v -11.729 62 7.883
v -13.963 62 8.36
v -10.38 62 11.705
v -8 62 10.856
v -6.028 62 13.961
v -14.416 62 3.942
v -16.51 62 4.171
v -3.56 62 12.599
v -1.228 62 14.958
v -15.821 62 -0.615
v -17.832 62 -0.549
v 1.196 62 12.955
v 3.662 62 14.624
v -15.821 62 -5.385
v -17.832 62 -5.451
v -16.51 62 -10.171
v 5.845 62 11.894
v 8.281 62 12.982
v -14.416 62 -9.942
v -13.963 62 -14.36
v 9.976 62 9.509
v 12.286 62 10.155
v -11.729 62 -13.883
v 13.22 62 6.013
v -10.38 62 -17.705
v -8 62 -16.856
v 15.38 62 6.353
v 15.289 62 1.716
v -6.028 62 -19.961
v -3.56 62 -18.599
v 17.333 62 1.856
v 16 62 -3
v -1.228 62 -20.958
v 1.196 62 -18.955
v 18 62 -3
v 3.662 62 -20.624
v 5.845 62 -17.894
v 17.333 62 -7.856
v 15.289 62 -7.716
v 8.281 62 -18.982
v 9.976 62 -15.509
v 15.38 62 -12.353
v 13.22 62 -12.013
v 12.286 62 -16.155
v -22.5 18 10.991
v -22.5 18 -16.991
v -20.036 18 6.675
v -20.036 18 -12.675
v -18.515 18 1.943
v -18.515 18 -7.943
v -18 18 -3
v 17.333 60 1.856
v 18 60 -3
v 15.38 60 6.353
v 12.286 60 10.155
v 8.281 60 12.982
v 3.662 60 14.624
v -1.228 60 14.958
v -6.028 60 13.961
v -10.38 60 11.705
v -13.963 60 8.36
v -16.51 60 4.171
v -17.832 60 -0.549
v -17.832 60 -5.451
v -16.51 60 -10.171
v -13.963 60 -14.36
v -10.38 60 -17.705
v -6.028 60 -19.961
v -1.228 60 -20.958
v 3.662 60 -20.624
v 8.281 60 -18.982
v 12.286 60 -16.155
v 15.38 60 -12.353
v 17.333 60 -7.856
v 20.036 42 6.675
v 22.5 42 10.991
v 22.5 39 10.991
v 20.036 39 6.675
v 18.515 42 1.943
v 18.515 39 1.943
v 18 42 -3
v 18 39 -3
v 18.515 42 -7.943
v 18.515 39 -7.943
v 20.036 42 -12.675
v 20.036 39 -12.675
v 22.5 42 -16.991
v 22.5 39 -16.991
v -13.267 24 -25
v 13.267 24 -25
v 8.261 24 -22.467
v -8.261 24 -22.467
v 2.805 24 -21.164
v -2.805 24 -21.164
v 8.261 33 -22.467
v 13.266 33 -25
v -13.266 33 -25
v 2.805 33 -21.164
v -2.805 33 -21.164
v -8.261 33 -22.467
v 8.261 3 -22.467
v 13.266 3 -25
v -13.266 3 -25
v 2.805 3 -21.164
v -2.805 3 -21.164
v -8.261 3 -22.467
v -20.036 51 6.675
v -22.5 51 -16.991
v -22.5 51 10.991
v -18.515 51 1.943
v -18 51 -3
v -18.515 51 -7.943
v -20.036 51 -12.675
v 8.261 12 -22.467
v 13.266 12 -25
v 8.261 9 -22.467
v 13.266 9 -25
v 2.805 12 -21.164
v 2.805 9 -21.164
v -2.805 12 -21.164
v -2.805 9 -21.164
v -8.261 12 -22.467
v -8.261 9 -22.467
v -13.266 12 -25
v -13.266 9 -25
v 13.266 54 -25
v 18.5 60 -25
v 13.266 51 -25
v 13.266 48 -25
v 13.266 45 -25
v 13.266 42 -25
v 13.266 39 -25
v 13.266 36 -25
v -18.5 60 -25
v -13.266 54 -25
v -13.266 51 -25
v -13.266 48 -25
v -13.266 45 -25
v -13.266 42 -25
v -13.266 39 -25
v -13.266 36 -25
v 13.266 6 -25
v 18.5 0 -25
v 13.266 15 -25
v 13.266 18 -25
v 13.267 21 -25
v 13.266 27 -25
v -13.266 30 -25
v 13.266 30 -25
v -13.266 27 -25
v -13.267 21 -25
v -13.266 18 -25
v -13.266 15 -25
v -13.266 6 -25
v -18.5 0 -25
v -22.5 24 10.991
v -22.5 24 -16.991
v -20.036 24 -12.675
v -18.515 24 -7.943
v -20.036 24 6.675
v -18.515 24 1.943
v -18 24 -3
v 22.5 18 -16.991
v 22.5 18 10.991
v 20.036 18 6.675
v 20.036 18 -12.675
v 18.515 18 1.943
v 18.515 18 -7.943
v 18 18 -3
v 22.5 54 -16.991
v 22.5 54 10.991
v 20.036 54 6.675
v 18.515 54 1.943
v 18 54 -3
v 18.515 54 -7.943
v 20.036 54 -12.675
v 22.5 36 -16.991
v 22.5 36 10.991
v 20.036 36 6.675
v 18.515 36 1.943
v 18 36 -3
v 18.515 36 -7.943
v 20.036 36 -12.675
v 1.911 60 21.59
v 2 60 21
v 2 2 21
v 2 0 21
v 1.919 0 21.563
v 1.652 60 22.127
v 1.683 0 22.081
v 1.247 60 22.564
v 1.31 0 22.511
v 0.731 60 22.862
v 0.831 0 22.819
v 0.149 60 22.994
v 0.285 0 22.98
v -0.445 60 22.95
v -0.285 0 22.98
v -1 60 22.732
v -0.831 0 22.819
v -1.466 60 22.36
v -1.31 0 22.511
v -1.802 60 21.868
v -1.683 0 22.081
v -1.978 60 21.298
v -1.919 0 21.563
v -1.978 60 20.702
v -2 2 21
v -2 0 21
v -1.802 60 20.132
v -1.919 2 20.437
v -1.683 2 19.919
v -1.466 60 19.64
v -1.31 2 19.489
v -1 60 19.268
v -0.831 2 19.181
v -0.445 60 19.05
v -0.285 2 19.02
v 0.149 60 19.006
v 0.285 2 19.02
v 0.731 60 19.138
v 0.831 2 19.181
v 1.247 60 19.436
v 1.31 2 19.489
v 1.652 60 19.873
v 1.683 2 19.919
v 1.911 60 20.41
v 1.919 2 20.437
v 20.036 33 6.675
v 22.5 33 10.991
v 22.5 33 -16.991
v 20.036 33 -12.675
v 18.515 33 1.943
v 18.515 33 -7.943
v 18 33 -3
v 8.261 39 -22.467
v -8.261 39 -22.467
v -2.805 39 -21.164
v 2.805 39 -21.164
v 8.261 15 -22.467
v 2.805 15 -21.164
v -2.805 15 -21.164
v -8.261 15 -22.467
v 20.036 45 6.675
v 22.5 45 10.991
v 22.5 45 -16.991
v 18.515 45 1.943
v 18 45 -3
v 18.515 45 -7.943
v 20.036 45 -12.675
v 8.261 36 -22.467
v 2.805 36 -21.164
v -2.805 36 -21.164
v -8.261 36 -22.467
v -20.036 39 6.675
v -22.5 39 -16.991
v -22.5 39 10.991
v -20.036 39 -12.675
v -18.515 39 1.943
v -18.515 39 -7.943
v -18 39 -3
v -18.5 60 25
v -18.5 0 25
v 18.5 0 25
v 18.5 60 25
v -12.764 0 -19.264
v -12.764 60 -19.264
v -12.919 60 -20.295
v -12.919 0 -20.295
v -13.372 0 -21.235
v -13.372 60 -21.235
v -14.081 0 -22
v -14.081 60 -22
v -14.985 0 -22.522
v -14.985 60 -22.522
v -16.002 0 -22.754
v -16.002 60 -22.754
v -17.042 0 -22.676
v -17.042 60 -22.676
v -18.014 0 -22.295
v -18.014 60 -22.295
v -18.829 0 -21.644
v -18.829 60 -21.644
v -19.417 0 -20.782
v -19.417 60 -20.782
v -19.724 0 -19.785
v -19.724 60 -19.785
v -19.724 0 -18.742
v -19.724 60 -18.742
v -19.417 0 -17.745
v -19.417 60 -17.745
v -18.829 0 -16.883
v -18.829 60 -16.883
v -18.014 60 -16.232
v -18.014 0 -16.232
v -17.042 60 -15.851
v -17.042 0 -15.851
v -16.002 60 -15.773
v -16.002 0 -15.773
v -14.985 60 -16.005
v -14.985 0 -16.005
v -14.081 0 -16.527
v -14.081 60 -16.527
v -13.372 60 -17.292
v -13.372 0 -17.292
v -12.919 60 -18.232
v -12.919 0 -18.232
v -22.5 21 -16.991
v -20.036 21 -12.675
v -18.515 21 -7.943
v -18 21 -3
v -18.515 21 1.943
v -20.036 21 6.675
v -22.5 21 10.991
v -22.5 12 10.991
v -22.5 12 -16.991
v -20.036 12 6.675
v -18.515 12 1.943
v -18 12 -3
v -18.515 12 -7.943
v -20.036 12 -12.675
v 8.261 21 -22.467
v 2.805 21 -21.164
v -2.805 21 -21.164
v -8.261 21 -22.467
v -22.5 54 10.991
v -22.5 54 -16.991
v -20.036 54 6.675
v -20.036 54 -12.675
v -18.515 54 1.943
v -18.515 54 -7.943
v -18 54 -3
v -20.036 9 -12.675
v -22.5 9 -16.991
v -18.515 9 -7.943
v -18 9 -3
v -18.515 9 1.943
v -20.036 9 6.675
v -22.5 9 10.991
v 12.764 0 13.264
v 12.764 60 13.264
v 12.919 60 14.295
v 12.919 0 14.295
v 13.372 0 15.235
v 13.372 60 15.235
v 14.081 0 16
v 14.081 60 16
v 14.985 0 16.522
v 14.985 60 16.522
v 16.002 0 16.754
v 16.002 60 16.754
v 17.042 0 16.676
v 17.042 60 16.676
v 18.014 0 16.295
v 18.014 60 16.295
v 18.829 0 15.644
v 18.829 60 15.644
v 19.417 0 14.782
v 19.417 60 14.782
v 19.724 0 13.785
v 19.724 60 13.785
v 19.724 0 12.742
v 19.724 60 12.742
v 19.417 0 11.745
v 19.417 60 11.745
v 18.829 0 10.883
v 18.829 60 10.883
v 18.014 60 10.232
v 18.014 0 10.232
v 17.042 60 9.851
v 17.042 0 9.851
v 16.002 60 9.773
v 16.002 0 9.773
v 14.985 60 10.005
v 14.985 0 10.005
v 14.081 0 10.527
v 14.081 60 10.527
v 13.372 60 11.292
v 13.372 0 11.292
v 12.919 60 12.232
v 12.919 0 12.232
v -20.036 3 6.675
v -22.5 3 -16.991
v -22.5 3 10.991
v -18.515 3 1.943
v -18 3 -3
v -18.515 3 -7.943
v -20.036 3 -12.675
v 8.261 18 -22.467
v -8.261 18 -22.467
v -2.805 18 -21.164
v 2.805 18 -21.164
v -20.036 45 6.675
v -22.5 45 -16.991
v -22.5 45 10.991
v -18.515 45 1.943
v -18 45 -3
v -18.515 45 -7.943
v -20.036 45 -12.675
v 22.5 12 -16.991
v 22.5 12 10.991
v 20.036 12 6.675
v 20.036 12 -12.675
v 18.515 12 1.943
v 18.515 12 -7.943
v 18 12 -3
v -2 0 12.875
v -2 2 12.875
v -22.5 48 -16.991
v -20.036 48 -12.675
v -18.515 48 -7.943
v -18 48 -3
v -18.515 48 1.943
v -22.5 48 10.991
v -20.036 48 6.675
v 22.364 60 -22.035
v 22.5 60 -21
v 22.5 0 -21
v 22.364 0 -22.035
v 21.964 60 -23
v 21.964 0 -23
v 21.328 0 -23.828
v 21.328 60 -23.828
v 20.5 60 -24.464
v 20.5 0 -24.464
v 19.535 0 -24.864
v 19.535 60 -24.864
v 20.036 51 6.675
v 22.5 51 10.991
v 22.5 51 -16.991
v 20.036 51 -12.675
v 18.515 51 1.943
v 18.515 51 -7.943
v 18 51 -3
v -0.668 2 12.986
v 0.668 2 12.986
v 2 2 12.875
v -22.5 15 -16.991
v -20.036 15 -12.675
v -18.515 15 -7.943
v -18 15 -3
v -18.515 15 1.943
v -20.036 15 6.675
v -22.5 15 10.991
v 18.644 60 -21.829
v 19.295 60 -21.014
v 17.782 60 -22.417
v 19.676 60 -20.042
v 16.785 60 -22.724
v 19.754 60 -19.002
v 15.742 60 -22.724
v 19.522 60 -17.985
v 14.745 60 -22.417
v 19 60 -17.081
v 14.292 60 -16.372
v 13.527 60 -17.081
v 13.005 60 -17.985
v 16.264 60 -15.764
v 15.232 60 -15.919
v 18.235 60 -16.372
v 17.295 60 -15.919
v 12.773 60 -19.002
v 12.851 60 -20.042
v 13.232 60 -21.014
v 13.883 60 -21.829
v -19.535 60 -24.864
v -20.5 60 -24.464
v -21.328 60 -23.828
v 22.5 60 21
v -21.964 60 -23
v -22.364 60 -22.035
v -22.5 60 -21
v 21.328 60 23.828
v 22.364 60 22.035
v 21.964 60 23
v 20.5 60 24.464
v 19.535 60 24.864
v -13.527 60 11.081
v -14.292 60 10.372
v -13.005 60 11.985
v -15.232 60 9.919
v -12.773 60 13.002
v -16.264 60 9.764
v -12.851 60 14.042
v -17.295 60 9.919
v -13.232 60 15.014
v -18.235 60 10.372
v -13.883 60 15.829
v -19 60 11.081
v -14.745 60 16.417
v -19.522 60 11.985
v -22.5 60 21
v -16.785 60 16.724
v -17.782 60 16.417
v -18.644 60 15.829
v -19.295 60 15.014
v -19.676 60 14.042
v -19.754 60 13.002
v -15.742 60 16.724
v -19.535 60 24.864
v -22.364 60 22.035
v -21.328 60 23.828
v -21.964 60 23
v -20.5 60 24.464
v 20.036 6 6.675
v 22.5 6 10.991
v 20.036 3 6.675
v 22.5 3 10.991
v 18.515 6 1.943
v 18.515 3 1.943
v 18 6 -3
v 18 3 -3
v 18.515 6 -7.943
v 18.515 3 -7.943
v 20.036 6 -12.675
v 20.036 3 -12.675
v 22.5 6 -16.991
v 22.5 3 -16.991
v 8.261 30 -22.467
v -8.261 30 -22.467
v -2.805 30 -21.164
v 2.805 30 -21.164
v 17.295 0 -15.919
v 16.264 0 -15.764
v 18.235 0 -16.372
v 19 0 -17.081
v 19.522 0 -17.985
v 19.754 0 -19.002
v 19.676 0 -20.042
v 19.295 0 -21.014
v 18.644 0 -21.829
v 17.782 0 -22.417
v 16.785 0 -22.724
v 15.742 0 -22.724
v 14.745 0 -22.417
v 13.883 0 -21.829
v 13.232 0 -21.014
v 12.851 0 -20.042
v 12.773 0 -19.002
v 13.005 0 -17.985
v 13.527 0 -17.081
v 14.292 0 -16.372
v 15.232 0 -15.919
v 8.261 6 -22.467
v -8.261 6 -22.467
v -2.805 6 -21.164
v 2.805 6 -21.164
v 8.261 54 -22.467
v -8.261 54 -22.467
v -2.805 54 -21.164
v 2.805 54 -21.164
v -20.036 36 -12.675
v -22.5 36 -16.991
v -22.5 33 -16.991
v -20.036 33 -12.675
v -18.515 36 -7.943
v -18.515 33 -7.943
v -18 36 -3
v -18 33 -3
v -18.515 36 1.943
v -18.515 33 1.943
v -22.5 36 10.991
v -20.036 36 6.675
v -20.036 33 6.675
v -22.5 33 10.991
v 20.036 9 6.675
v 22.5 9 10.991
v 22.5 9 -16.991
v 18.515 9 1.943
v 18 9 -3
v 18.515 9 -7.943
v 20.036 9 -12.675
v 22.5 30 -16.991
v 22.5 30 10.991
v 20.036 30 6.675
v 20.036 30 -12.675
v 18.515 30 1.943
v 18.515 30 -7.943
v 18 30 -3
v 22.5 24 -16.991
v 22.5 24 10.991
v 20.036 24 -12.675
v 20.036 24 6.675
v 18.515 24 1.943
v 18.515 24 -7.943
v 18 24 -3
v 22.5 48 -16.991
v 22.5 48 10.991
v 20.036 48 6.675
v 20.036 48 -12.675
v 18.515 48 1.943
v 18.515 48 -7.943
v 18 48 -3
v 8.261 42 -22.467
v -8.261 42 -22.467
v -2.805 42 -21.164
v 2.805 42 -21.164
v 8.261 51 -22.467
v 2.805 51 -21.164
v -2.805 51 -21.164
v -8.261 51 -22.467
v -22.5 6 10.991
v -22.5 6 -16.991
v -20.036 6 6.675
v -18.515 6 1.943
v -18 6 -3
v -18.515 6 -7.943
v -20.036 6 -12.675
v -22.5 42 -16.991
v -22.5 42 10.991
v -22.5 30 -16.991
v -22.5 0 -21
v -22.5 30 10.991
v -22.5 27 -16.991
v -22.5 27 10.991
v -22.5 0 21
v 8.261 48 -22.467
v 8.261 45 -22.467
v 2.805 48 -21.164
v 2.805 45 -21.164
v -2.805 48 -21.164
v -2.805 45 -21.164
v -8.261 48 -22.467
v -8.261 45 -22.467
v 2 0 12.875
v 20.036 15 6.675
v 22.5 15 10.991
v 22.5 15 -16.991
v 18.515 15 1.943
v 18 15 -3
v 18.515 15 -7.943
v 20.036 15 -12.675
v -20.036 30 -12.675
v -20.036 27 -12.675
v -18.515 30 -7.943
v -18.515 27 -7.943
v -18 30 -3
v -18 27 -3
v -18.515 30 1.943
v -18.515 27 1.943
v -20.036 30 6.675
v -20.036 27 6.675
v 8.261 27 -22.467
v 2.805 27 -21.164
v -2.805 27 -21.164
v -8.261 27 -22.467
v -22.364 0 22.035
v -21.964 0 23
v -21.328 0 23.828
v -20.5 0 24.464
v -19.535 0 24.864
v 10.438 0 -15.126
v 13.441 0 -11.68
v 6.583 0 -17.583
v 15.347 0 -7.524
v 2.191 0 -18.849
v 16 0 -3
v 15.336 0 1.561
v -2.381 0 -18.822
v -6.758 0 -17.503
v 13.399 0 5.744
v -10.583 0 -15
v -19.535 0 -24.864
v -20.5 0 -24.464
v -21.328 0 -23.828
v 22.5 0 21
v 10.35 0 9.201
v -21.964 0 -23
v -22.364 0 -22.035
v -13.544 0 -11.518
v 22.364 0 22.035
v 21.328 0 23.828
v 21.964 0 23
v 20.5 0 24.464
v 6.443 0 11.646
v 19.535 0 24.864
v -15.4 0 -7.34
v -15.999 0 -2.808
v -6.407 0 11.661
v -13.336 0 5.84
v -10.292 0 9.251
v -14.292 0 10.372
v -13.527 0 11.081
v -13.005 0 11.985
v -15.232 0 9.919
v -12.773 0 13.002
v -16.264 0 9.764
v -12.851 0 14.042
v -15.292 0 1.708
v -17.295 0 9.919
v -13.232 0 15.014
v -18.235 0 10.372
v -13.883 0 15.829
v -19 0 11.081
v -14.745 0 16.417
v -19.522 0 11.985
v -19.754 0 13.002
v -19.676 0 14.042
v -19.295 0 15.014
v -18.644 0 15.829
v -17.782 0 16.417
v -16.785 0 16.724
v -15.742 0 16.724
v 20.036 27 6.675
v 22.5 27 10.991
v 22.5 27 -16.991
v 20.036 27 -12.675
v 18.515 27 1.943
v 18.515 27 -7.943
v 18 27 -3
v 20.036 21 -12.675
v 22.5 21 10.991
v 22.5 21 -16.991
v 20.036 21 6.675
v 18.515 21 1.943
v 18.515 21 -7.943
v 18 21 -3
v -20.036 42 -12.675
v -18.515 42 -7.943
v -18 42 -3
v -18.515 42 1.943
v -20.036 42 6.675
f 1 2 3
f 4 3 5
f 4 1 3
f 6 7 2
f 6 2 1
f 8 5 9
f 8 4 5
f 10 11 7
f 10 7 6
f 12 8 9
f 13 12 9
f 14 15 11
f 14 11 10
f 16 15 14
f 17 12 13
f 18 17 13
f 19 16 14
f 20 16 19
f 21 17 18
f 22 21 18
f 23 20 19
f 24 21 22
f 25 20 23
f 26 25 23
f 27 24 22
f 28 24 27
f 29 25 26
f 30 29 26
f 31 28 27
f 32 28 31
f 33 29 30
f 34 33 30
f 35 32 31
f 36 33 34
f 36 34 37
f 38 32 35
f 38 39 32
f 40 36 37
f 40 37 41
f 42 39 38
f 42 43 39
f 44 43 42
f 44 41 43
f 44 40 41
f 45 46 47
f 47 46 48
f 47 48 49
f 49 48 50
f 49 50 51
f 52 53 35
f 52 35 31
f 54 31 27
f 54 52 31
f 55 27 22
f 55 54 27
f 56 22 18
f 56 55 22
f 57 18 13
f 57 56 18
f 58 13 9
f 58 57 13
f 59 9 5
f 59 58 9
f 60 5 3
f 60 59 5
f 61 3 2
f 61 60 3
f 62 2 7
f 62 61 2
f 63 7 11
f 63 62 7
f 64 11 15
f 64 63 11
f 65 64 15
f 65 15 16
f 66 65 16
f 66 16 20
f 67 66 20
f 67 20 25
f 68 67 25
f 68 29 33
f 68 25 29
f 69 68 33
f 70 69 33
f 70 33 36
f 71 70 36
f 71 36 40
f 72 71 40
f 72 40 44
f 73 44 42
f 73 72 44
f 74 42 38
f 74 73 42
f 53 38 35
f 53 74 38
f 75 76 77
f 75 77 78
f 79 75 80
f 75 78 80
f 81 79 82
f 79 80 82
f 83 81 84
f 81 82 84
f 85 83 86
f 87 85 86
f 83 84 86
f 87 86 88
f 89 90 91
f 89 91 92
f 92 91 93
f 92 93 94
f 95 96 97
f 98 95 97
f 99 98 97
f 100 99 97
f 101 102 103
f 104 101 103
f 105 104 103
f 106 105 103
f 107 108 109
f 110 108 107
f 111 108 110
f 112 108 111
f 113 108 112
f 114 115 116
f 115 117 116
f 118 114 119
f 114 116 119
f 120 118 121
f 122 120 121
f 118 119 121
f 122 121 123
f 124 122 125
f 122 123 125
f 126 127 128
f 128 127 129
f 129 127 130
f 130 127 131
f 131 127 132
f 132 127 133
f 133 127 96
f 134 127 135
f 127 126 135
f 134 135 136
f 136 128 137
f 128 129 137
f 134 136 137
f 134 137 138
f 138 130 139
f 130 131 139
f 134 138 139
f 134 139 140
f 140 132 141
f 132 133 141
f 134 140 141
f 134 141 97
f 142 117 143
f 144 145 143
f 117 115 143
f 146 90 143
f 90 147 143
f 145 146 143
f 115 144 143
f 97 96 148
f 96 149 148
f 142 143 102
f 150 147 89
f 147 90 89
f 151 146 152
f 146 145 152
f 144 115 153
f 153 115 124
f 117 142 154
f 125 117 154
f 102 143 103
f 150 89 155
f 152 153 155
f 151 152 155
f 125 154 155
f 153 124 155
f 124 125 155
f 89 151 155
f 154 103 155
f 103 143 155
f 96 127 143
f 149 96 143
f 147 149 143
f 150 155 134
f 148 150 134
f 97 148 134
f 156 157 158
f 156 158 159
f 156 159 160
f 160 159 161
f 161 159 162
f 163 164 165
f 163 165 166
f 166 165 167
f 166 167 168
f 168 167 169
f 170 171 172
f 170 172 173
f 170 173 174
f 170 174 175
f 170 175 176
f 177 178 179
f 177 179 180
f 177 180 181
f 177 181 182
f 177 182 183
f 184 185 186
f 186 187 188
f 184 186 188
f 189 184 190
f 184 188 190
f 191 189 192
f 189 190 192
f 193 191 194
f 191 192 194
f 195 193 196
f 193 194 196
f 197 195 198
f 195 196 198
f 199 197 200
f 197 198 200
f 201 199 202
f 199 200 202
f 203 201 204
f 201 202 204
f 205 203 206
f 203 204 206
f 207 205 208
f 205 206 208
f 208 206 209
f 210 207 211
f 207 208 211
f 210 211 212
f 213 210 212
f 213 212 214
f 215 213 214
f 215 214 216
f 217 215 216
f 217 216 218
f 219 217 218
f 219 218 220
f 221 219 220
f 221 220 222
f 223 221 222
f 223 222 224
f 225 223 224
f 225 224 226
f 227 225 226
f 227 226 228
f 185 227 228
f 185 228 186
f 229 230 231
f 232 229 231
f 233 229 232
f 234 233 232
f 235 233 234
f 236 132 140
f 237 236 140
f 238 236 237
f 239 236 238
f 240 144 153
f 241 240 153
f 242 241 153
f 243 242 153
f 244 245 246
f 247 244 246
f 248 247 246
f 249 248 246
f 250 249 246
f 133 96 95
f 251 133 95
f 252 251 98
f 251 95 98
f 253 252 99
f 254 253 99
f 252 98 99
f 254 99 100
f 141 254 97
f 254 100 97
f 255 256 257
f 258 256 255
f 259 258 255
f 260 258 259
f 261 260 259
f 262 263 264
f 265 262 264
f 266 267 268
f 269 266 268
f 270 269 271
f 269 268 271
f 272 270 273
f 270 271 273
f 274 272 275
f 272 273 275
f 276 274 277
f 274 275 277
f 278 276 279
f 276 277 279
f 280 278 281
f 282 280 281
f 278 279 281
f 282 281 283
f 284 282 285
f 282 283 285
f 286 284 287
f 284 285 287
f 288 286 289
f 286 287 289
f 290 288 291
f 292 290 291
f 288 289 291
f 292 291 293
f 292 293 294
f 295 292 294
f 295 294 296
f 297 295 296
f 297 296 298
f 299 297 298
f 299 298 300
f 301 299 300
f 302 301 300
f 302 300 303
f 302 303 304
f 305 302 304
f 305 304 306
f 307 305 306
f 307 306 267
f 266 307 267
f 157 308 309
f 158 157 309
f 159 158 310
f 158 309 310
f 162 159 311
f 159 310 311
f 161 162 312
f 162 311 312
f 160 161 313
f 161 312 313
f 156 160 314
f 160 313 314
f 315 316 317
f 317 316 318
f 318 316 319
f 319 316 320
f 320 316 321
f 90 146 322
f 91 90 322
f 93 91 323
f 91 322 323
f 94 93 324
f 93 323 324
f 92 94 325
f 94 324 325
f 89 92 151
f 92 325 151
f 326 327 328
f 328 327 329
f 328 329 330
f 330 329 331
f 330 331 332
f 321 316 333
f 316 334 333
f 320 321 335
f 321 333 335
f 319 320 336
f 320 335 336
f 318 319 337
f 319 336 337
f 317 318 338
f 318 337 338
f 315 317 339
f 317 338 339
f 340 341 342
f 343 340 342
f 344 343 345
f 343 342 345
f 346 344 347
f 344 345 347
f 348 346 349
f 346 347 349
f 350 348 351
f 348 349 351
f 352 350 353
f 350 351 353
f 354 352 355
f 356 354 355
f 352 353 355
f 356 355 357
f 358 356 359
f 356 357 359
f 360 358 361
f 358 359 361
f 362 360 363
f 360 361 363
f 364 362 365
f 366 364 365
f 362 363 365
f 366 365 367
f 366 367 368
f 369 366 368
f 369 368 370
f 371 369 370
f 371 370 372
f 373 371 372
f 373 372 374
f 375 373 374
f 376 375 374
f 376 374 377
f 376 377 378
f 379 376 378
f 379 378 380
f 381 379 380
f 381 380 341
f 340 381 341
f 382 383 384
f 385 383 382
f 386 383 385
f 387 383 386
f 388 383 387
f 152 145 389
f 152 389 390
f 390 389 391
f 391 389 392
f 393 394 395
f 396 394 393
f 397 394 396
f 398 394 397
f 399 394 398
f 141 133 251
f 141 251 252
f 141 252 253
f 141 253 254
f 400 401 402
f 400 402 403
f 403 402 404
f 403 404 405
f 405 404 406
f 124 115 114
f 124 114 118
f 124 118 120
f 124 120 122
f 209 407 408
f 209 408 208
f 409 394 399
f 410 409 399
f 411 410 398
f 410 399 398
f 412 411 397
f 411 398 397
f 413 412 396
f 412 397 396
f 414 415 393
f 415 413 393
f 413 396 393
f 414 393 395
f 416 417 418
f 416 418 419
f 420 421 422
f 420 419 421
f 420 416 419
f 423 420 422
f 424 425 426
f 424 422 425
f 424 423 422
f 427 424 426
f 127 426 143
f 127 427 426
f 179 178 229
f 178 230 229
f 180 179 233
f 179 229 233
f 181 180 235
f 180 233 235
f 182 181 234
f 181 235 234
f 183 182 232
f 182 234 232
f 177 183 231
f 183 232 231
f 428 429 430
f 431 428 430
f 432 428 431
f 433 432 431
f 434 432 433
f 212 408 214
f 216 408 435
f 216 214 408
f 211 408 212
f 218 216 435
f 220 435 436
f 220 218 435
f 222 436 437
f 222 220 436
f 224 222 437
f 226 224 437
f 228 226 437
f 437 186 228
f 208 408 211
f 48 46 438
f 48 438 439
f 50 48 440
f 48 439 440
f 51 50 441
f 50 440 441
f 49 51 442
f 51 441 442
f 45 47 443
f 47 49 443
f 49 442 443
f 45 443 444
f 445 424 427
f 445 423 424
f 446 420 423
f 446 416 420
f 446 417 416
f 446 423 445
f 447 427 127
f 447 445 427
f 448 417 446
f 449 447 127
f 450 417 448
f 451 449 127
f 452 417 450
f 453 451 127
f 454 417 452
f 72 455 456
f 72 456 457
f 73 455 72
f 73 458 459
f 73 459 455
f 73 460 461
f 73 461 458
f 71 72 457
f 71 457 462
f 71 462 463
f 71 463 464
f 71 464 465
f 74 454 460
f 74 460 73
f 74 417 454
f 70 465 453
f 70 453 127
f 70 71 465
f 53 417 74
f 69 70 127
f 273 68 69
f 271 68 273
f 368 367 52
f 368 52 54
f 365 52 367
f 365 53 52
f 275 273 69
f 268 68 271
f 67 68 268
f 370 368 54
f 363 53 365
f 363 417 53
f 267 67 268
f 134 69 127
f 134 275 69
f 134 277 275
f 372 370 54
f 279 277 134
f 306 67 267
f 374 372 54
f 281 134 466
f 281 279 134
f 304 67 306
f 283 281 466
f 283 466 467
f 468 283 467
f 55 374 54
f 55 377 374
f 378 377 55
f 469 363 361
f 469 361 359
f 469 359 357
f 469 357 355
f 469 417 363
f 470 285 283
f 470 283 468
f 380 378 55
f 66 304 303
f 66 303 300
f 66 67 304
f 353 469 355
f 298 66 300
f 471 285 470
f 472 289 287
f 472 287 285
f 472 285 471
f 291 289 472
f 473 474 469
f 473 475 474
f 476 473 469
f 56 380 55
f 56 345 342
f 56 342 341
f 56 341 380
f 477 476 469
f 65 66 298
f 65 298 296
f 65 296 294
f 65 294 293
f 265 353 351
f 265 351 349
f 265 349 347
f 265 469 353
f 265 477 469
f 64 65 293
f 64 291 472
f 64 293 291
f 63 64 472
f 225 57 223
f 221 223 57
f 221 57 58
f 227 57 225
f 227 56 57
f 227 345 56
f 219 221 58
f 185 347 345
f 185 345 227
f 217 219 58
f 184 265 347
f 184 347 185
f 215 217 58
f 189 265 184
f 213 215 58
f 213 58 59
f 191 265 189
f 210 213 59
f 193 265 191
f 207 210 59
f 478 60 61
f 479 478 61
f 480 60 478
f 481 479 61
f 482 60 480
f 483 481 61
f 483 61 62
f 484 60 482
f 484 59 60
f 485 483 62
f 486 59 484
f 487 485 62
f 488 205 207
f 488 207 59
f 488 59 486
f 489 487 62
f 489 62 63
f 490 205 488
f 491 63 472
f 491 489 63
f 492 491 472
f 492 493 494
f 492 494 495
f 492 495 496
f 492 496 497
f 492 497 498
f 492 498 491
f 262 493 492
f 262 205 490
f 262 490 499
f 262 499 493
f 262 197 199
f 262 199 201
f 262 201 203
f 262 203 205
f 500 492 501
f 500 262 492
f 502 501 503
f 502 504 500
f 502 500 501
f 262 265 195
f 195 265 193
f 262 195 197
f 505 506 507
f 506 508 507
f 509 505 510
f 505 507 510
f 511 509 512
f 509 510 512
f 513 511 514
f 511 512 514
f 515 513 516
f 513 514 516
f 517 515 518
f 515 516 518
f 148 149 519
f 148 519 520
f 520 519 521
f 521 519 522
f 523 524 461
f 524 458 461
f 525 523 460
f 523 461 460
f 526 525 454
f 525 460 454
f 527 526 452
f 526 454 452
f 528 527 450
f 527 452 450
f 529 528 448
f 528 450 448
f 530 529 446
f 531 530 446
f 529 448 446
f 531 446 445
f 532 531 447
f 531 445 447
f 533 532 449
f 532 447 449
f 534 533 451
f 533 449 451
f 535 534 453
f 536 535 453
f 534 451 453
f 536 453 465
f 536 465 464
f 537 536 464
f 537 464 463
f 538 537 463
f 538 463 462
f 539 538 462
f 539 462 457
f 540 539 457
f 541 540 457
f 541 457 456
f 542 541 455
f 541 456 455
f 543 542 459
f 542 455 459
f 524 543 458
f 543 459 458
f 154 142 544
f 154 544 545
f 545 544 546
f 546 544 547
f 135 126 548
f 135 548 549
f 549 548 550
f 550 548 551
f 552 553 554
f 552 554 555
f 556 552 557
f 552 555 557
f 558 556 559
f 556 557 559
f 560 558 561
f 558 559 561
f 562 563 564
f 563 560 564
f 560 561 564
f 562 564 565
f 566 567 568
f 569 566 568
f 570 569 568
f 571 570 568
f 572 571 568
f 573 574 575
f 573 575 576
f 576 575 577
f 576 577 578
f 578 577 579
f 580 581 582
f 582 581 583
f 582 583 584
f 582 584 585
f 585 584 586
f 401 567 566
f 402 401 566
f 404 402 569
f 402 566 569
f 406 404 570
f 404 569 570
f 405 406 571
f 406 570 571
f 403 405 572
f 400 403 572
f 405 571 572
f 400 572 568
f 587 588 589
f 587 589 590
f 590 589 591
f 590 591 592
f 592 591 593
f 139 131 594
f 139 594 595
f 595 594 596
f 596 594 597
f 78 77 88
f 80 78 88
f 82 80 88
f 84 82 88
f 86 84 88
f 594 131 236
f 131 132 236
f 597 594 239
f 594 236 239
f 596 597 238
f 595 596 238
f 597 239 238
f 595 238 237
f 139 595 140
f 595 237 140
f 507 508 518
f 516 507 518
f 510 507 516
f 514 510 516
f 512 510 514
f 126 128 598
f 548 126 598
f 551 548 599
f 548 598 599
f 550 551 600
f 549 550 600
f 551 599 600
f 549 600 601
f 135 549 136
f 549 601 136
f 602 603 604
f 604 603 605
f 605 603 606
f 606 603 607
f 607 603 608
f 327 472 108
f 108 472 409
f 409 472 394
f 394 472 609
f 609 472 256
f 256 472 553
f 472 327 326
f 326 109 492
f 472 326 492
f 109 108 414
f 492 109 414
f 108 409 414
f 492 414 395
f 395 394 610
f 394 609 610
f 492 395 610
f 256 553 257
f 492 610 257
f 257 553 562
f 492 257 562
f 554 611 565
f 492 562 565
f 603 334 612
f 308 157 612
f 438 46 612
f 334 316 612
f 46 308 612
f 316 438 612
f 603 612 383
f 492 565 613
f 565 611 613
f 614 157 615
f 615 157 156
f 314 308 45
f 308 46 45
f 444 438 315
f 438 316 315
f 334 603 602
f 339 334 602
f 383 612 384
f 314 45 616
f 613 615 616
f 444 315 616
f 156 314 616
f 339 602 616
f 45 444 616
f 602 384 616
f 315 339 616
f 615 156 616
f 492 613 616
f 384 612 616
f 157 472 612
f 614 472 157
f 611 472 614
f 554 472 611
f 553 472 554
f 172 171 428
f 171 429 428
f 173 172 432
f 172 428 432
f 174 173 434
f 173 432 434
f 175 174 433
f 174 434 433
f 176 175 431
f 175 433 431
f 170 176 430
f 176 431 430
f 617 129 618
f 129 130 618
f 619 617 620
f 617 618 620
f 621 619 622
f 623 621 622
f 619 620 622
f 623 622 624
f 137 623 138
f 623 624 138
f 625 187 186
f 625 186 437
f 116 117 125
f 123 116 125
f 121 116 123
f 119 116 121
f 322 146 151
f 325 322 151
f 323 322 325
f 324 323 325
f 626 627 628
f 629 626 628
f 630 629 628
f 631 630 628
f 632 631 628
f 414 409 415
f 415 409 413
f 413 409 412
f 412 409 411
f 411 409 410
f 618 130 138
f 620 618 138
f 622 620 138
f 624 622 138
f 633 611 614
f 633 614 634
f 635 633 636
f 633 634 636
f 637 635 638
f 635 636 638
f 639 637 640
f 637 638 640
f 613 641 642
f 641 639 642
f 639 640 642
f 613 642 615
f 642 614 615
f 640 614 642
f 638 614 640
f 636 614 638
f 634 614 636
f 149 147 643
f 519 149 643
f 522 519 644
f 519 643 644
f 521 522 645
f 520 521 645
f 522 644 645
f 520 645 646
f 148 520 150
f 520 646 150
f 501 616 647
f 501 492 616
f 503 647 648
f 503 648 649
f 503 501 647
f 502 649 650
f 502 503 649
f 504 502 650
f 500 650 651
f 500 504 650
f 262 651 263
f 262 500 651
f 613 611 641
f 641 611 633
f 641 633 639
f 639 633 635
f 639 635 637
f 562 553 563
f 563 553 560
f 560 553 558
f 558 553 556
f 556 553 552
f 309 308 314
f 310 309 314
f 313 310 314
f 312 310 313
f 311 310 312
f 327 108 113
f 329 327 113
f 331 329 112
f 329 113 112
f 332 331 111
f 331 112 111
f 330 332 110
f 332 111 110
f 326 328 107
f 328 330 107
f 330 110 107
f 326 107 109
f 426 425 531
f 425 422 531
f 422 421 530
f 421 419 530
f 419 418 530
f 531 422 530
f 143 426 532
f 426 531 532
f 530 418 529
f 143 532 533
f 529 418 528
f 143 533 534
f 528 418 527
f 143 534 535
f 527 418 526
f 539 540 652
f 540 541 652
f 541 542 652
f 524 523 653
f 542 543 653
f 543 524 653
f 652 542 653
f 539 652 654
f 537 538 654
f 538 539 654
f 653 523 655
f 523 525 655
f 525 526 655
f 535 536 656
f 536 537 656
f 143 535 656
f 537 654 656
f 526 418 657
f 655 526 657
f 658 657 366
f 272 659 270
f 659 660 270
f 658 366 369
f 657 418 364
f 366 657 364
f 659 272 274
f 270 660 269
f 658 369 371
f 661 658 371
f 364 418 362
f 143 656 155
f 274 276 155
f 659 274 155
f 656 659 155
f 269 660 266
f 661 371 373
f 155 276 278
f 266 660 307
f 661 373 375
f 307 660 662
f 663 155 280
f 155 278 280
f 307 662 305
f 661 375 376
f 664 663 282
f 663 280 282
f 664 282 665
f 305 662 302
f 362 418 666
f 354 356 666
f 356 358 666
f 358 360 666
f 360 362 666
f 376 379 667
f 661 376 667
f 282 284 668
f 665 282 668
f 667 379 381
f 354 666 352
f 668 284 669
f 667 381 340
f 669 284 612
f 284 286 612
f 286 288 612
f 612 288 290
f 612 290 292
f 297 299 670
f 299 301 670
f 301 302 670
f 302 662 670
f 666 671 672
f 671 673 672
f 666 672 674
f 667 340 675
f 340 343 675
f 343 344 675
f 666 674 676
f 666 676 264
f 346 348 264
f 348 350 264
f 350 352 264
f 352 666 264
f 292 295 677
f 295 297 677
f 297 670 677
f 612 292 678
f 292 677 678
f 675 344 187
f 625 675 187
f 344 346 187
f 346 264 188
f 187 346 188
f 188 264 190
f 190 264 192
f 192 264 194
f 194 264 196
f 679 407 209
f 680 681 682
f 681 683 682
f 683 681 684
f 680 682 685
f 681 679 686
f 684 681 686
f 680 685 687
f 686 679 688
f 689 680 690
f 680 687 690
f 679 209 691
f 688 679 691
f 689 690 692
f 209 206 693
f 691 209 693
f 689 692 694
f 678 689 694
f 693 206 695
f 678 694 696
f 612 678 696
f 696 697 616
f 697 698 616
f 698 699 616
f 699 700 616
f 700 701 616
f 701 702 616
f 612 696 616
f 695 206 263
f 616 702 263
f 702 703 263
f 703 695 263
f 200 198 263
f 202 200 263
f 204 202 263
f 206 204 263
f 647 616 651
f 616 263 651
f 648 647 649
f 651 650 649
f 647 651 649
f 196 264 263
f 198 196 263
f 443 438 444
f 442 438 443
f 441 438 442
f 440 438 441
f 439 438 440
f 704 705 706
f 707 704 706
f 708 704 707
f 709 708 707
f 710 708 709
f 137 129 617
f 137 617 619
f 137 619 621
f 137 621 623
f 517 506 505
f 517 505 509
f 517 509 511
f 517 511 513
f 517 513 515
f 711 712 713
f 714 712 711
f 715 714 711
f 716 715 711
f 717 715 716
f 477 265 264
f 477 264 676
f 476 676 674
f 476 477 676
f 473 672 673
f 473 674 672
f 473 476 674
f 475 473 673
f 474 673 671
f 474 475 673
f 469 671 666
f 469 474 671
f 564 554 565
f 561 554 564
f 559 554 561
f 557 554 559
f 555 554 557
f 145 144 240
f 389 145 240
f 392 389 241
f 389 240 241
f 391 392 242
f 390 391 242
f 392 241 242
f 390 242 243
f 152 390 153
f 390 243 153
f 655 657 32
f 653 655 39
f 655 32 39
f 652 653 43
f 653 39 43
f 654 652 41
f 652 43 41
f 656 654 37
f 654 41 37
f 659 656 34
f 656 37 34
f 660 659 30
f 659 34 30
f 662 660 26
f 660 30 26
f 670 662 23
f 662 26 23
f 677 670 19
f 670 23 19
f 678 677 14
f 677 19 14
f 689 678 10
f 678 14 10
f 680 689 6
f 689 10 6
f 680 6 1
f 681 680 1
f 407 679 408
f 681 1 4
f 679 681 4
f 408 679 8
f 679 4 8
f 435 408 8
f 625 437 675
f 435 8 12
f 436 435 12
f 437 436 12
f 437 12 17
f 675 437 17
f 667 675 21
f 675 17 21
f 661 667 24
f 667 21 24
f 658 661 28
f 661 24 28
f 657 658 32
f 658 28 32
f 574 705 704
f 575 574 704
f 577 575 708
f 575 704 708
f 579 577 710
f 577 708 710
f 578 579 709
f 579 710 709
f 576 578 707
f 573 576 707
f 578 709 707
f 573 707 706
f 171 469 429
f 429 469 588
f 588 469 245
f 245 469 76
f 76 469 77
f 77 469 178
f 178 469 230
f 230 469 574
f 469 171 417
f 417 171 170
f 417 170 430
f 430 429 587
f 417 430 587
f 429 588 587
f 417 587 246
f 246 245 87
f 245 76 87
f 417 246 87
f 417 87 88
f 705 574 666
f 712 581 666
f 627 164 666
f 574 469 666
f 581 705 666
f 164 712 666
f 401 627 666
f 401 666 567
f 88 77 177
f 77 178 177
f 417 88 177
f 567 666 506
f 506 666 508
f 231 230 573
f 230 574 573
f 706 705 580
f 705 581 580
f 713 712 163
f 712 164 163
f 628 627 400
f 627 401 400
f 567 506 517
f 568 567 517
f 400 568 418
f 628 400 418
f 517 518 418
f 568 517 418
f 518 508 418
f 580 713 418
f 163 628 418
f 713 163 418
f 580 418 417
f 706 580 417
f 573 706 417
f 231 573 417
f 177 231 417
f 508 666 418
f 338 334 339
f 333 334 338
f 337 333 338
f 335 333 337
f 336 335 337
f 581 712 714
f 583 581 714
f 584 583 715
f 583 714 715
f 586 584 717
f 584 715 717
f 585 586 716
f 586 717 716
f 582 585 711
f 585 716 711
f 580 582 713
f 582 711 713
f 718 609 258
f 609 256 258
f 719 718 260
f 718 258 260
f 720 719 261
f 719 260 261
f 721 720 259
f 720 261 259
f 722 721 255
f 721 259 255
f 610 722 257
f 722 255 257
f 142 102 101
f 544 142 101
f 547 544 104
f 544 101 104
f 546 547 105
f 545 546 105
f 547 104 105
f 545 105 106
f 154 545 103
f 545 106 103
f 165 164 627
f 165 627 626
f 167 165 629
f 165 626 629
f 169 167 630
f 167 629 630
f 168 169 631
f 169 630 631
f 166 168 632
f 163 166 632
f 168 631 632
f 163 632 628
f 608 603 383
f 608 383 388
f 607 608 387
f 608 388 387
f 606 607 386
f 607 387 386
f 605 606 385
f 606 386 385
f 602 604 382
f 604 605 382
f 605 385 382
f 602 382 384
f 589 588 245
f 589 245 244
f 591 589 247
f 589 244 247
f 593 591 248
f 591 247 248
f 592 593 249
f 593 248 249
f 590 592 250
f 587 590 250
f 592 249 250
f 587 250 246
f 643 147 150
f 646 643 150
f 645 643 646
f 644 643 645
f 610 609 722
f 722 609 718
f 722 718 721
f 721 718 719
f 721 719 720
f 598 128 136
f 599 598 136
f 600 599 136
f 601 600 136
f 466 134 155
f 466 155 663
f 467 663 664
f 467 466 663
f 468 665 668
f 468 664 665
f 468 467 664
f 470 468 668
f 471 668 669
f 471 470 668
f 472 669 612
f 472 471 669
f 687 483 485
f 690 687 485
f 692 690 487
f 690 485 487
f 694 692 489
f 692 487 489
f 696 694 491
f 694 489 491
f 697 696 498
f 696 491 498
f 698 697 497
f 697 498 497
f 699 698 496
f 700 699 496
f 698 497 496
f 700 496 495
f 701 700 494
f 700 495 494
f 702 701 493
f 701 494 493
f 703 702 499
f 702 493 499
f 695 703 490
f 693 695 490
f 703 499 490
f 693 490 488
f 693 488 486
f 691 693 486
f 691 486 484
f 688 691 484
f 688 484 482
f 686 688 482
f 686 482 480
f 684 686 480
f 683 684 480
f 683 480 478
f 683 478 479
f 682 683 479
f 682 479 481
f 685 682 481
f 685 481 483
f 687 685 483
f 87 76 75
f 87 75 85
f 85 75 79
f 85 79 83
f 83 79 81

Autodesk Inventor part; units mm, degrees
sketch "Sketch1" plane through (0, 0, 0) normal (0, 1, 0) x (-1, 0, 0)
  line L0 (22.5, 25) -> (-22.5, 25)
  line L1 (-22.5, 25) -> (-22.5, -25)
  line L2 (-22.5, -25) -> (22.5, -25)
  line L3 (22.5, -25) -> (22.5, 25)
  line L4 (22.5, 25) -> (-22.5, -25) construction
  line L5 (-22.5, 25) -> (22.5, -25) construction
  point P0 (0, 0)
  dimension "d0" = 45
  dimension "d1" = 50
extrude "Extrusion1" add sketch "Sketch1" along normal blind 60
fillet "Fillet1" radius 4 4 edges at (22.5, 30, 25) (-22.5, 30, 25) (22.5, 30, -25) (-22.5, 30, -25)
sketch "Sketch2" plane through (0, 60, 0) normal (0, 1, 0) x (1, 0, 0)
  circle A0 centre (0, 3) radius 16
  point P0 (0, 0)
  dimension "d5" = 32
  dimension "d109" = 3
extrude "Extrusion2" cut sketch "Sketch2" against normal blind 60
ref_plane "Work Plane3" through (0, 3, 0) normal (0, -1, 0) x (1, 0, 0)
sketch "Sketch13" plane through (0, 3, 0) normal (0, -1, 0) x (1, 0, 0)
  circle A0 centre (42, -3) radius 24
  point P0 (0, 0)
  dimension "d27" = 48
extrude "Extrusion7" cut sketch "Sketch13" against normal blind 3
ref_plane "Work Plane4" through (0, 9, 0) normal (0, -1, 0) x (1, 0, 0)
sketch "Sketch14" plane through (0, 9, 0) normal (0, -1, 0) x (1, 0, 0)
  circle A0 centre (42, -3) radius 24
  point P0 (0, 0)
  dimension "d34" = 48
extrude "Extrusion8" cut sketch "Sketch14" against normal blind 3
ref_plane "Work Plane12" through (0, 15, 0) normal (0, -1, 0) x (1, 0, 0)
sketch "Sketch15" plane through (0, 15, 0) normal (0, -1, 0) x (1, 0, 0)
  circle A0 centre (42, -3) radius 24
  point P0 (0, 0)
  dimension "d41" = 48
extrude "Extrusion9" cut sketch "Sketch15" against normal blind 3
ref_plane "Work Plane13" through (0, 21, 0) normal (0, -1, 0) x (1, 0, 0)
sketch "Sketch16" plane through (0, 21, 0) normal (0, -1, 0) x (1, 0, 0)
  arc A0 (22.5, 10.9911) -> (22.5, -16.9911) centre (42, -3) ccw projected
  circle A1 centre (42, -3) radius 24
  point P0 (0, 0)
  point P1 (22.5, -16.9911)
  dimension "d45" = 48
extrude "Extrusion10" cut sketch "Sketch16" against normal blind 3
ref_plane "Work Plane14" through (0, 27, 0) normal (0, -1, 0) x (1, 0, 0)
sketch "Sketch17" plane through (0, 27, 0) normal (0, -1, 0) x (1, 0, 0)
  circle A0 centre (42, -3) radius 24
  point P0 (0, 0)
  dimension "d49" = 48
extrude "Extrusion11" cut sketch "Sketch17" against normal blind 3
ref_plane "Work Plane15" through (0, 33, 0) normal (0, -1, 0) x (1, 0, 0)
sketch "Sketch18" plane through (0, 33, 0) normal (0, -1, 0) x (1, 0, 0)
  circle A0 centre (42, -3) radius 24
  point P0 (0, 0)
  dimension "d53" = 48
extrude "Extrusion12" cut sketch "Sketch18" against normal blind 3
ref_plane "Work Plane16" through (0, 39, 0) normal (0, -1, 0) x (1, 0, 0)
sketch "Sketch19" plane through (0, 39, 0) normal (0, -1, 0) x (1, 0, 0)
  circle A0 centre (42, -3) radius 24
  point P0 (0, 0)
  dimension "d57" = 48
extrude "Extrusion13" cut sketch "Sketch19" against normal blind 3
ref_plane "Work Plane17" through (0, 45, 0) normal (0, -1, 0) x (1, 0, 0)
sketch "Sketch20" plane through (0, 45, 0) normal (0, -1, 0) x (1, 0, 0)
  circle A0 centre (42, -3) radius 24
  point P0 (0, 0)
  dimension "d61" = 48
extrude "Extrusion14" cut sketch "Sketch20" against normal blind 3
ref_plane "Work Plane18" through (0, 51, 0) normal (0, -1, 0) x (1, 0, 0)
sketch "Sketch21" plane through (0, 51, 0) normal (0, -1, 0) x (1, 0, 0)
  circle A0 centre (42, -3) radius 24
  point P0 (0, 0)
  dimension "d65" = 48
extrude "Extrusion15" cut sketch "Sketch21" against normal blind 3
mirror "Mirror1" about plane through (0, 0, 0) normal (1, 0, 0) of "Extrusion7", "Extrusion8", "Extrusion9", "Extrusion10", "Extrusion11", "Extrusion12", "Extrusion13", "Extrusion14", "Extrusion15"
pattern_circular "Circular Pattern3" count 2 over 90 about axis through (0, 60, -3) along (0, 1, 0) of "Extrusion15", "Extrusion14", "Extrusion13", "Extrusion12", "Extrusion11", "Extrusion10", "Extrusion9", "Extrusion8", "Extrusion7"
sketch "Sketch22" plane through (0, 0, 0) normal (0, -1, 0) x (1, 0, 0)
  line L0 (2, 11) -> (-2, 11)
  line L1 (-2, 11) -> (-2, 21)
  line L2 (-2, 21) -> (2, 21)
  line L3 (2, 21) -> (2, 11)
  line L4 (2, 11) -> (-2, 21) construction
  line L5 (-2, 11) -> (2, 21) construction
  point P0 (0, 0)
  point P1 (0, 16)
  dimension "d74" = 4
  dimension "d75" = 10
extrude "Extrusion16" cut sketch "Sketch22" against normal blind 2
sketch "Sketch23" plane through (0, 0, 0) normal (0, -1, 0) x (1, 0, 0)
  line L0 (0, 0) -> (0, 21)
  line L1 (-2, 12.8745) -> (-2, 21) projected
sketch "Sketch24" plane through (0, 0, 0) normal (0, -1, 0) x (1, 0, 0)
  circle A0 centre (0, 21) radius 2
  point P0 (0, 0)
  dimension "d78" = 4
extrude "Extrusion17" cut sketch "Sketch24" against normal blind 62
sketch "Sketch25" plane through (0, 0, 21) normal (0, -1, 0) x (1, 0, 0)
  point P0 (0, -21)
sketch "Sketch27" plane through (0, 60, 0) normal (0, 1, 0) x (1, 0, 0)
  line L0 (0, 3) -> (-16.2635, 19.2635)
  line L1 (0, 3) -> (23, 3) construction
  circle A0 centre (-16.2635, 19.2635) radius 3.5
  point P0 (0, 0)
  dimension "d91" = 23
  dimension "d92" = 135
  dimension "d93" = 7
extrude "Extrusion18" cut sketch "Sketch27" against normal blind 60
pattern_circular "Circular Pattern5" count 4 over 360 about axis through (0, 60, -3) along (0, -1, 0) of "Extrusion18"
sketch "Sketch30" plane through (0, 60, 0) normal (0, 1, 0) x (1, 0, 0)
  circle A0 centre (0, 3) radius 18
  point P0 (0, 0)
  dimension "d110" = 36
extrude "Extrusion21" add sketch "Sketch30" along normal blind 2
sketch "Sketch31" plane through (0, 62, -3) normal (0, 1, 0) x (1, 0, 0)
  circle A0 centre (0, 0) radius 16
  point P0 (0, -3)
  dimension "d113" = 32
extrude "Extrusion22" cut sketch "Sketch31" against normal blind 2
properties part number "cylinder incomplete"
